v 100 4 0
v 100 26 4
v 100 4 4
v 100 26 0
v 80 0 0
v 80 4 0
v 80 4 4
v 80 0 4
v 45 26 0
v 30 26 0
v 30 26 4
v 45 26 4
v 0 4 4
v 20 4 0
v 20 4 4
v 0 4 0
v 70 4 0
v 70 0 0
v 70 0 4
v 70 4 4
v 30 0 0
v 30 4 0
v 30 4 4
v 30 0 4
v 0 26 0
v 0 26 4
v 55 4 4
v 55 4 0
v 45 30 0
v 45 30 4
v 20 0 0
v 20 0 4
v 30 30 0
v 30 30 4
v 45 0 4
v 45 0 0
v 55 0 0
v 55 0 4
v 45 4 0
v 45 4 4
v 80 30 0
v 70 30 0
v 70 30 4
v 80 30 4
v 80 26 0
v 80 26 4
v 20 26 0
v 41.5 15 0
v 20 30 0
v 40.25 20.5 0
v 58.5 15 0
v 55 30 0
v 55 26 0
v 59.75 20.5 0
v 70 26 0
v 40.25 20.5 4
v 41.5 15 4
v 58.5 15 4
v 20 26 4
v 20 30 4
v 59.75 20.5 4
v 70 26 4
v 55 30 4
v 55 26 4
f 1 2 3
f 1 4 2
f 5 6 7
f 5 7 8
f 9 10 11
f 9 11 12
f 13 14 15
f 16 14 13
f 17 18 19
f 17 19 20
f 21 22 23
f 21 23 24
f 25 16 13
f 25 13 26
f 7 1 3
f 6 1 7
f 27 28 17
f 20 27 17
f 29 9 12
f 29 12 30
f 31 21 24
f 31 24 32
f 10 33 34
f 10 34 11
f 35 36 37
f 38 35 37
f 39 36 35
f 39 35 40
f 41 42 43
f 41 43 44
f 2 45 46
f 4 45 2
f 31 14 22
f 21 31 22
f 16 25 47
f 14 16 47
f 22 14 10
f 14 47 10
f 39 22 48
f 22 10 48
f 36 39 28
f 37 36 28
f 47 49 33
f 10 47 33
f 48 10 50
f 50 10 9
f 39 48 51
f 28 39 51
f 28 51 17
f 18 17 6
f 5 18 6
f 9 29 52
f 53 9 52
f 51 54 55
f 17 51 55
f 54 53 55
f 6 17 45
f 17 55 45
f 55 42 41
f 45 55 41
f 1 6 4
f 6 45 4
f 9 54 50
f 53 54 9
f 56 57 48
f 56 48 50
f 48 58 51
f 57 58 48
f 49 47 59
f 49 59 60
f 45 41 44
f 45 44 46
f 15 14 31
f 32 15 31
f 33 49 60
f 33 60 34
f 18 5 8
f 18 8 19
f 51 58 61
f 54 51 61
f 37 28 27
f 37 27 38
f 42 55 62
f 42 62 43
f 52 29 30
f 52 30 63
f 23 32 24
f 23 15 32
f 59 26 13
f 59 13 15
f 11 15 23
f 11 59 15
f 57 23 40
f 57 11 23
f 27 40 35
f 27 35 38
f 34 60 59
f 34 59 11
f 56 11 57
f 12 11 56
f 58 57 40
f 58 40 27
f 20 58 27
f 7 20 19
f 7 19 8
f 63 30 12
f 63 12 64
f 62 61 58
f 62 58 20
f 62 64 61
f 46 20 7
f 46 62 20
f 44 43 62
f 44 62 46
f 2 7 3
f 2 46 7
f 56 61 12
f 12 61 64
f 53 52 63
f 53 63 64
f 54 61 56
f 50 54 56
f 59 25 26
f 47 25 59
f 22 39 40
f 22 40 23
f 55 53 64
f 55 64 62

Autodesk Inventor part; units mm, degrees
ref_plane "YZ Plane" through (0, 0, 0) normal (1, 0, 0) x (0, 1, 0)
ref_plane "XZ Plane" through (0, 0, 0) normal (0, 1, 0) x (-1, 0, 0)
ref_plane "XY Plane" through (0, 0, 0) normal (0, 0, 1) x (1, 0, 0)
sketch "Sketch1" plane through (0, 0, 0) normal (0, 0, 1) x (1, 0, 0)
  line L0 (0, 4) -> (0, 26)
  line L1 (0, 26) -> (20, 26)
  line L2 (20, 26) -> (20, 30)
  line L3 (20, 30) -> (30, 30)
  line L4 (30, 30) -> (30, 26)
  line L5 (30, 26) -> (45, 26)
  line L6 (45, 26) -> (45, 30)
  line L7 (45, 30) -> (55, 30)
  line L8 (55, 30) -> (55, 26)
  line L9 (55, 26) -> (70, 26)
  line L10 (70, 26) -> (70, 30)
  line L11 (70, 30) -> (80, 30)
  line L12 (80, 30) -> (80, 26)
  line L13 (80, 26) -> (100, 26)
  line L14 (100, 26) -> (100, 4)
  line L15 (100, 4) -> (80, 4)
  line L16 (80, 4) -> (80, 0)
  line L17 (80, 0) -> (70, 0)
  line L18 (70, 0) -> (70, 4)
  line L19 (55, 4) -> (70, 4)
  line L20 (55, 4) -> (55, 0)
  line L21 (45, 0) -> (45, 4)
  line L22 (30, 4) -> (30, 0)
  line L23 (45, 4) -> (30, 4)
  line L24 (45, 0) -> (55, 0)
  line L25 (30, 0) -> (20, 0)
  line L26 (20, 4) -> (20, 0)
  line L27 (20, 4) -> (0, 4)
  point P0 (0, 0)
  dimension "d0" = 22
  dimension "d1" = 20
  dimension "d2" = 4
  dimension "d3" = 10
  dimension "d4" = 15
  dimension "d5" = 10
  dimension "d6" = 15
  dimension "d7" = 10
  dimension "d8" = 20
  dimension "d9" = 22
  dimension "d10" = 20
extrude "Extrusion1" add sketch "Sketch1" along normal blind 4
sketch "Sketch2" plane through (0, 0, 4) normal (0, 0, 1) x (1, 0, 0)
  line L0 (50, 20.5) -> (40.25, 20.5)
  line L1 (40.25, 20.5) -> (59.75, 20.5)
  line L2 (50, 15) -> (58.5, 15)
  line L3 (58.5, 15) -> (41.5, 15)
  line L4 (41.5, 15) -> (40.25, 20.5)
  line L5 (58.5, 15) -> (59.75, 20.5)
  point P0 (0, 0)
  dimension "d19" = 5.5
  dimension "d20" = 9.75
extrude "Extrusion2" cut sketch "Sketch2" against normal blind 4
properties part number "front(vga)"
